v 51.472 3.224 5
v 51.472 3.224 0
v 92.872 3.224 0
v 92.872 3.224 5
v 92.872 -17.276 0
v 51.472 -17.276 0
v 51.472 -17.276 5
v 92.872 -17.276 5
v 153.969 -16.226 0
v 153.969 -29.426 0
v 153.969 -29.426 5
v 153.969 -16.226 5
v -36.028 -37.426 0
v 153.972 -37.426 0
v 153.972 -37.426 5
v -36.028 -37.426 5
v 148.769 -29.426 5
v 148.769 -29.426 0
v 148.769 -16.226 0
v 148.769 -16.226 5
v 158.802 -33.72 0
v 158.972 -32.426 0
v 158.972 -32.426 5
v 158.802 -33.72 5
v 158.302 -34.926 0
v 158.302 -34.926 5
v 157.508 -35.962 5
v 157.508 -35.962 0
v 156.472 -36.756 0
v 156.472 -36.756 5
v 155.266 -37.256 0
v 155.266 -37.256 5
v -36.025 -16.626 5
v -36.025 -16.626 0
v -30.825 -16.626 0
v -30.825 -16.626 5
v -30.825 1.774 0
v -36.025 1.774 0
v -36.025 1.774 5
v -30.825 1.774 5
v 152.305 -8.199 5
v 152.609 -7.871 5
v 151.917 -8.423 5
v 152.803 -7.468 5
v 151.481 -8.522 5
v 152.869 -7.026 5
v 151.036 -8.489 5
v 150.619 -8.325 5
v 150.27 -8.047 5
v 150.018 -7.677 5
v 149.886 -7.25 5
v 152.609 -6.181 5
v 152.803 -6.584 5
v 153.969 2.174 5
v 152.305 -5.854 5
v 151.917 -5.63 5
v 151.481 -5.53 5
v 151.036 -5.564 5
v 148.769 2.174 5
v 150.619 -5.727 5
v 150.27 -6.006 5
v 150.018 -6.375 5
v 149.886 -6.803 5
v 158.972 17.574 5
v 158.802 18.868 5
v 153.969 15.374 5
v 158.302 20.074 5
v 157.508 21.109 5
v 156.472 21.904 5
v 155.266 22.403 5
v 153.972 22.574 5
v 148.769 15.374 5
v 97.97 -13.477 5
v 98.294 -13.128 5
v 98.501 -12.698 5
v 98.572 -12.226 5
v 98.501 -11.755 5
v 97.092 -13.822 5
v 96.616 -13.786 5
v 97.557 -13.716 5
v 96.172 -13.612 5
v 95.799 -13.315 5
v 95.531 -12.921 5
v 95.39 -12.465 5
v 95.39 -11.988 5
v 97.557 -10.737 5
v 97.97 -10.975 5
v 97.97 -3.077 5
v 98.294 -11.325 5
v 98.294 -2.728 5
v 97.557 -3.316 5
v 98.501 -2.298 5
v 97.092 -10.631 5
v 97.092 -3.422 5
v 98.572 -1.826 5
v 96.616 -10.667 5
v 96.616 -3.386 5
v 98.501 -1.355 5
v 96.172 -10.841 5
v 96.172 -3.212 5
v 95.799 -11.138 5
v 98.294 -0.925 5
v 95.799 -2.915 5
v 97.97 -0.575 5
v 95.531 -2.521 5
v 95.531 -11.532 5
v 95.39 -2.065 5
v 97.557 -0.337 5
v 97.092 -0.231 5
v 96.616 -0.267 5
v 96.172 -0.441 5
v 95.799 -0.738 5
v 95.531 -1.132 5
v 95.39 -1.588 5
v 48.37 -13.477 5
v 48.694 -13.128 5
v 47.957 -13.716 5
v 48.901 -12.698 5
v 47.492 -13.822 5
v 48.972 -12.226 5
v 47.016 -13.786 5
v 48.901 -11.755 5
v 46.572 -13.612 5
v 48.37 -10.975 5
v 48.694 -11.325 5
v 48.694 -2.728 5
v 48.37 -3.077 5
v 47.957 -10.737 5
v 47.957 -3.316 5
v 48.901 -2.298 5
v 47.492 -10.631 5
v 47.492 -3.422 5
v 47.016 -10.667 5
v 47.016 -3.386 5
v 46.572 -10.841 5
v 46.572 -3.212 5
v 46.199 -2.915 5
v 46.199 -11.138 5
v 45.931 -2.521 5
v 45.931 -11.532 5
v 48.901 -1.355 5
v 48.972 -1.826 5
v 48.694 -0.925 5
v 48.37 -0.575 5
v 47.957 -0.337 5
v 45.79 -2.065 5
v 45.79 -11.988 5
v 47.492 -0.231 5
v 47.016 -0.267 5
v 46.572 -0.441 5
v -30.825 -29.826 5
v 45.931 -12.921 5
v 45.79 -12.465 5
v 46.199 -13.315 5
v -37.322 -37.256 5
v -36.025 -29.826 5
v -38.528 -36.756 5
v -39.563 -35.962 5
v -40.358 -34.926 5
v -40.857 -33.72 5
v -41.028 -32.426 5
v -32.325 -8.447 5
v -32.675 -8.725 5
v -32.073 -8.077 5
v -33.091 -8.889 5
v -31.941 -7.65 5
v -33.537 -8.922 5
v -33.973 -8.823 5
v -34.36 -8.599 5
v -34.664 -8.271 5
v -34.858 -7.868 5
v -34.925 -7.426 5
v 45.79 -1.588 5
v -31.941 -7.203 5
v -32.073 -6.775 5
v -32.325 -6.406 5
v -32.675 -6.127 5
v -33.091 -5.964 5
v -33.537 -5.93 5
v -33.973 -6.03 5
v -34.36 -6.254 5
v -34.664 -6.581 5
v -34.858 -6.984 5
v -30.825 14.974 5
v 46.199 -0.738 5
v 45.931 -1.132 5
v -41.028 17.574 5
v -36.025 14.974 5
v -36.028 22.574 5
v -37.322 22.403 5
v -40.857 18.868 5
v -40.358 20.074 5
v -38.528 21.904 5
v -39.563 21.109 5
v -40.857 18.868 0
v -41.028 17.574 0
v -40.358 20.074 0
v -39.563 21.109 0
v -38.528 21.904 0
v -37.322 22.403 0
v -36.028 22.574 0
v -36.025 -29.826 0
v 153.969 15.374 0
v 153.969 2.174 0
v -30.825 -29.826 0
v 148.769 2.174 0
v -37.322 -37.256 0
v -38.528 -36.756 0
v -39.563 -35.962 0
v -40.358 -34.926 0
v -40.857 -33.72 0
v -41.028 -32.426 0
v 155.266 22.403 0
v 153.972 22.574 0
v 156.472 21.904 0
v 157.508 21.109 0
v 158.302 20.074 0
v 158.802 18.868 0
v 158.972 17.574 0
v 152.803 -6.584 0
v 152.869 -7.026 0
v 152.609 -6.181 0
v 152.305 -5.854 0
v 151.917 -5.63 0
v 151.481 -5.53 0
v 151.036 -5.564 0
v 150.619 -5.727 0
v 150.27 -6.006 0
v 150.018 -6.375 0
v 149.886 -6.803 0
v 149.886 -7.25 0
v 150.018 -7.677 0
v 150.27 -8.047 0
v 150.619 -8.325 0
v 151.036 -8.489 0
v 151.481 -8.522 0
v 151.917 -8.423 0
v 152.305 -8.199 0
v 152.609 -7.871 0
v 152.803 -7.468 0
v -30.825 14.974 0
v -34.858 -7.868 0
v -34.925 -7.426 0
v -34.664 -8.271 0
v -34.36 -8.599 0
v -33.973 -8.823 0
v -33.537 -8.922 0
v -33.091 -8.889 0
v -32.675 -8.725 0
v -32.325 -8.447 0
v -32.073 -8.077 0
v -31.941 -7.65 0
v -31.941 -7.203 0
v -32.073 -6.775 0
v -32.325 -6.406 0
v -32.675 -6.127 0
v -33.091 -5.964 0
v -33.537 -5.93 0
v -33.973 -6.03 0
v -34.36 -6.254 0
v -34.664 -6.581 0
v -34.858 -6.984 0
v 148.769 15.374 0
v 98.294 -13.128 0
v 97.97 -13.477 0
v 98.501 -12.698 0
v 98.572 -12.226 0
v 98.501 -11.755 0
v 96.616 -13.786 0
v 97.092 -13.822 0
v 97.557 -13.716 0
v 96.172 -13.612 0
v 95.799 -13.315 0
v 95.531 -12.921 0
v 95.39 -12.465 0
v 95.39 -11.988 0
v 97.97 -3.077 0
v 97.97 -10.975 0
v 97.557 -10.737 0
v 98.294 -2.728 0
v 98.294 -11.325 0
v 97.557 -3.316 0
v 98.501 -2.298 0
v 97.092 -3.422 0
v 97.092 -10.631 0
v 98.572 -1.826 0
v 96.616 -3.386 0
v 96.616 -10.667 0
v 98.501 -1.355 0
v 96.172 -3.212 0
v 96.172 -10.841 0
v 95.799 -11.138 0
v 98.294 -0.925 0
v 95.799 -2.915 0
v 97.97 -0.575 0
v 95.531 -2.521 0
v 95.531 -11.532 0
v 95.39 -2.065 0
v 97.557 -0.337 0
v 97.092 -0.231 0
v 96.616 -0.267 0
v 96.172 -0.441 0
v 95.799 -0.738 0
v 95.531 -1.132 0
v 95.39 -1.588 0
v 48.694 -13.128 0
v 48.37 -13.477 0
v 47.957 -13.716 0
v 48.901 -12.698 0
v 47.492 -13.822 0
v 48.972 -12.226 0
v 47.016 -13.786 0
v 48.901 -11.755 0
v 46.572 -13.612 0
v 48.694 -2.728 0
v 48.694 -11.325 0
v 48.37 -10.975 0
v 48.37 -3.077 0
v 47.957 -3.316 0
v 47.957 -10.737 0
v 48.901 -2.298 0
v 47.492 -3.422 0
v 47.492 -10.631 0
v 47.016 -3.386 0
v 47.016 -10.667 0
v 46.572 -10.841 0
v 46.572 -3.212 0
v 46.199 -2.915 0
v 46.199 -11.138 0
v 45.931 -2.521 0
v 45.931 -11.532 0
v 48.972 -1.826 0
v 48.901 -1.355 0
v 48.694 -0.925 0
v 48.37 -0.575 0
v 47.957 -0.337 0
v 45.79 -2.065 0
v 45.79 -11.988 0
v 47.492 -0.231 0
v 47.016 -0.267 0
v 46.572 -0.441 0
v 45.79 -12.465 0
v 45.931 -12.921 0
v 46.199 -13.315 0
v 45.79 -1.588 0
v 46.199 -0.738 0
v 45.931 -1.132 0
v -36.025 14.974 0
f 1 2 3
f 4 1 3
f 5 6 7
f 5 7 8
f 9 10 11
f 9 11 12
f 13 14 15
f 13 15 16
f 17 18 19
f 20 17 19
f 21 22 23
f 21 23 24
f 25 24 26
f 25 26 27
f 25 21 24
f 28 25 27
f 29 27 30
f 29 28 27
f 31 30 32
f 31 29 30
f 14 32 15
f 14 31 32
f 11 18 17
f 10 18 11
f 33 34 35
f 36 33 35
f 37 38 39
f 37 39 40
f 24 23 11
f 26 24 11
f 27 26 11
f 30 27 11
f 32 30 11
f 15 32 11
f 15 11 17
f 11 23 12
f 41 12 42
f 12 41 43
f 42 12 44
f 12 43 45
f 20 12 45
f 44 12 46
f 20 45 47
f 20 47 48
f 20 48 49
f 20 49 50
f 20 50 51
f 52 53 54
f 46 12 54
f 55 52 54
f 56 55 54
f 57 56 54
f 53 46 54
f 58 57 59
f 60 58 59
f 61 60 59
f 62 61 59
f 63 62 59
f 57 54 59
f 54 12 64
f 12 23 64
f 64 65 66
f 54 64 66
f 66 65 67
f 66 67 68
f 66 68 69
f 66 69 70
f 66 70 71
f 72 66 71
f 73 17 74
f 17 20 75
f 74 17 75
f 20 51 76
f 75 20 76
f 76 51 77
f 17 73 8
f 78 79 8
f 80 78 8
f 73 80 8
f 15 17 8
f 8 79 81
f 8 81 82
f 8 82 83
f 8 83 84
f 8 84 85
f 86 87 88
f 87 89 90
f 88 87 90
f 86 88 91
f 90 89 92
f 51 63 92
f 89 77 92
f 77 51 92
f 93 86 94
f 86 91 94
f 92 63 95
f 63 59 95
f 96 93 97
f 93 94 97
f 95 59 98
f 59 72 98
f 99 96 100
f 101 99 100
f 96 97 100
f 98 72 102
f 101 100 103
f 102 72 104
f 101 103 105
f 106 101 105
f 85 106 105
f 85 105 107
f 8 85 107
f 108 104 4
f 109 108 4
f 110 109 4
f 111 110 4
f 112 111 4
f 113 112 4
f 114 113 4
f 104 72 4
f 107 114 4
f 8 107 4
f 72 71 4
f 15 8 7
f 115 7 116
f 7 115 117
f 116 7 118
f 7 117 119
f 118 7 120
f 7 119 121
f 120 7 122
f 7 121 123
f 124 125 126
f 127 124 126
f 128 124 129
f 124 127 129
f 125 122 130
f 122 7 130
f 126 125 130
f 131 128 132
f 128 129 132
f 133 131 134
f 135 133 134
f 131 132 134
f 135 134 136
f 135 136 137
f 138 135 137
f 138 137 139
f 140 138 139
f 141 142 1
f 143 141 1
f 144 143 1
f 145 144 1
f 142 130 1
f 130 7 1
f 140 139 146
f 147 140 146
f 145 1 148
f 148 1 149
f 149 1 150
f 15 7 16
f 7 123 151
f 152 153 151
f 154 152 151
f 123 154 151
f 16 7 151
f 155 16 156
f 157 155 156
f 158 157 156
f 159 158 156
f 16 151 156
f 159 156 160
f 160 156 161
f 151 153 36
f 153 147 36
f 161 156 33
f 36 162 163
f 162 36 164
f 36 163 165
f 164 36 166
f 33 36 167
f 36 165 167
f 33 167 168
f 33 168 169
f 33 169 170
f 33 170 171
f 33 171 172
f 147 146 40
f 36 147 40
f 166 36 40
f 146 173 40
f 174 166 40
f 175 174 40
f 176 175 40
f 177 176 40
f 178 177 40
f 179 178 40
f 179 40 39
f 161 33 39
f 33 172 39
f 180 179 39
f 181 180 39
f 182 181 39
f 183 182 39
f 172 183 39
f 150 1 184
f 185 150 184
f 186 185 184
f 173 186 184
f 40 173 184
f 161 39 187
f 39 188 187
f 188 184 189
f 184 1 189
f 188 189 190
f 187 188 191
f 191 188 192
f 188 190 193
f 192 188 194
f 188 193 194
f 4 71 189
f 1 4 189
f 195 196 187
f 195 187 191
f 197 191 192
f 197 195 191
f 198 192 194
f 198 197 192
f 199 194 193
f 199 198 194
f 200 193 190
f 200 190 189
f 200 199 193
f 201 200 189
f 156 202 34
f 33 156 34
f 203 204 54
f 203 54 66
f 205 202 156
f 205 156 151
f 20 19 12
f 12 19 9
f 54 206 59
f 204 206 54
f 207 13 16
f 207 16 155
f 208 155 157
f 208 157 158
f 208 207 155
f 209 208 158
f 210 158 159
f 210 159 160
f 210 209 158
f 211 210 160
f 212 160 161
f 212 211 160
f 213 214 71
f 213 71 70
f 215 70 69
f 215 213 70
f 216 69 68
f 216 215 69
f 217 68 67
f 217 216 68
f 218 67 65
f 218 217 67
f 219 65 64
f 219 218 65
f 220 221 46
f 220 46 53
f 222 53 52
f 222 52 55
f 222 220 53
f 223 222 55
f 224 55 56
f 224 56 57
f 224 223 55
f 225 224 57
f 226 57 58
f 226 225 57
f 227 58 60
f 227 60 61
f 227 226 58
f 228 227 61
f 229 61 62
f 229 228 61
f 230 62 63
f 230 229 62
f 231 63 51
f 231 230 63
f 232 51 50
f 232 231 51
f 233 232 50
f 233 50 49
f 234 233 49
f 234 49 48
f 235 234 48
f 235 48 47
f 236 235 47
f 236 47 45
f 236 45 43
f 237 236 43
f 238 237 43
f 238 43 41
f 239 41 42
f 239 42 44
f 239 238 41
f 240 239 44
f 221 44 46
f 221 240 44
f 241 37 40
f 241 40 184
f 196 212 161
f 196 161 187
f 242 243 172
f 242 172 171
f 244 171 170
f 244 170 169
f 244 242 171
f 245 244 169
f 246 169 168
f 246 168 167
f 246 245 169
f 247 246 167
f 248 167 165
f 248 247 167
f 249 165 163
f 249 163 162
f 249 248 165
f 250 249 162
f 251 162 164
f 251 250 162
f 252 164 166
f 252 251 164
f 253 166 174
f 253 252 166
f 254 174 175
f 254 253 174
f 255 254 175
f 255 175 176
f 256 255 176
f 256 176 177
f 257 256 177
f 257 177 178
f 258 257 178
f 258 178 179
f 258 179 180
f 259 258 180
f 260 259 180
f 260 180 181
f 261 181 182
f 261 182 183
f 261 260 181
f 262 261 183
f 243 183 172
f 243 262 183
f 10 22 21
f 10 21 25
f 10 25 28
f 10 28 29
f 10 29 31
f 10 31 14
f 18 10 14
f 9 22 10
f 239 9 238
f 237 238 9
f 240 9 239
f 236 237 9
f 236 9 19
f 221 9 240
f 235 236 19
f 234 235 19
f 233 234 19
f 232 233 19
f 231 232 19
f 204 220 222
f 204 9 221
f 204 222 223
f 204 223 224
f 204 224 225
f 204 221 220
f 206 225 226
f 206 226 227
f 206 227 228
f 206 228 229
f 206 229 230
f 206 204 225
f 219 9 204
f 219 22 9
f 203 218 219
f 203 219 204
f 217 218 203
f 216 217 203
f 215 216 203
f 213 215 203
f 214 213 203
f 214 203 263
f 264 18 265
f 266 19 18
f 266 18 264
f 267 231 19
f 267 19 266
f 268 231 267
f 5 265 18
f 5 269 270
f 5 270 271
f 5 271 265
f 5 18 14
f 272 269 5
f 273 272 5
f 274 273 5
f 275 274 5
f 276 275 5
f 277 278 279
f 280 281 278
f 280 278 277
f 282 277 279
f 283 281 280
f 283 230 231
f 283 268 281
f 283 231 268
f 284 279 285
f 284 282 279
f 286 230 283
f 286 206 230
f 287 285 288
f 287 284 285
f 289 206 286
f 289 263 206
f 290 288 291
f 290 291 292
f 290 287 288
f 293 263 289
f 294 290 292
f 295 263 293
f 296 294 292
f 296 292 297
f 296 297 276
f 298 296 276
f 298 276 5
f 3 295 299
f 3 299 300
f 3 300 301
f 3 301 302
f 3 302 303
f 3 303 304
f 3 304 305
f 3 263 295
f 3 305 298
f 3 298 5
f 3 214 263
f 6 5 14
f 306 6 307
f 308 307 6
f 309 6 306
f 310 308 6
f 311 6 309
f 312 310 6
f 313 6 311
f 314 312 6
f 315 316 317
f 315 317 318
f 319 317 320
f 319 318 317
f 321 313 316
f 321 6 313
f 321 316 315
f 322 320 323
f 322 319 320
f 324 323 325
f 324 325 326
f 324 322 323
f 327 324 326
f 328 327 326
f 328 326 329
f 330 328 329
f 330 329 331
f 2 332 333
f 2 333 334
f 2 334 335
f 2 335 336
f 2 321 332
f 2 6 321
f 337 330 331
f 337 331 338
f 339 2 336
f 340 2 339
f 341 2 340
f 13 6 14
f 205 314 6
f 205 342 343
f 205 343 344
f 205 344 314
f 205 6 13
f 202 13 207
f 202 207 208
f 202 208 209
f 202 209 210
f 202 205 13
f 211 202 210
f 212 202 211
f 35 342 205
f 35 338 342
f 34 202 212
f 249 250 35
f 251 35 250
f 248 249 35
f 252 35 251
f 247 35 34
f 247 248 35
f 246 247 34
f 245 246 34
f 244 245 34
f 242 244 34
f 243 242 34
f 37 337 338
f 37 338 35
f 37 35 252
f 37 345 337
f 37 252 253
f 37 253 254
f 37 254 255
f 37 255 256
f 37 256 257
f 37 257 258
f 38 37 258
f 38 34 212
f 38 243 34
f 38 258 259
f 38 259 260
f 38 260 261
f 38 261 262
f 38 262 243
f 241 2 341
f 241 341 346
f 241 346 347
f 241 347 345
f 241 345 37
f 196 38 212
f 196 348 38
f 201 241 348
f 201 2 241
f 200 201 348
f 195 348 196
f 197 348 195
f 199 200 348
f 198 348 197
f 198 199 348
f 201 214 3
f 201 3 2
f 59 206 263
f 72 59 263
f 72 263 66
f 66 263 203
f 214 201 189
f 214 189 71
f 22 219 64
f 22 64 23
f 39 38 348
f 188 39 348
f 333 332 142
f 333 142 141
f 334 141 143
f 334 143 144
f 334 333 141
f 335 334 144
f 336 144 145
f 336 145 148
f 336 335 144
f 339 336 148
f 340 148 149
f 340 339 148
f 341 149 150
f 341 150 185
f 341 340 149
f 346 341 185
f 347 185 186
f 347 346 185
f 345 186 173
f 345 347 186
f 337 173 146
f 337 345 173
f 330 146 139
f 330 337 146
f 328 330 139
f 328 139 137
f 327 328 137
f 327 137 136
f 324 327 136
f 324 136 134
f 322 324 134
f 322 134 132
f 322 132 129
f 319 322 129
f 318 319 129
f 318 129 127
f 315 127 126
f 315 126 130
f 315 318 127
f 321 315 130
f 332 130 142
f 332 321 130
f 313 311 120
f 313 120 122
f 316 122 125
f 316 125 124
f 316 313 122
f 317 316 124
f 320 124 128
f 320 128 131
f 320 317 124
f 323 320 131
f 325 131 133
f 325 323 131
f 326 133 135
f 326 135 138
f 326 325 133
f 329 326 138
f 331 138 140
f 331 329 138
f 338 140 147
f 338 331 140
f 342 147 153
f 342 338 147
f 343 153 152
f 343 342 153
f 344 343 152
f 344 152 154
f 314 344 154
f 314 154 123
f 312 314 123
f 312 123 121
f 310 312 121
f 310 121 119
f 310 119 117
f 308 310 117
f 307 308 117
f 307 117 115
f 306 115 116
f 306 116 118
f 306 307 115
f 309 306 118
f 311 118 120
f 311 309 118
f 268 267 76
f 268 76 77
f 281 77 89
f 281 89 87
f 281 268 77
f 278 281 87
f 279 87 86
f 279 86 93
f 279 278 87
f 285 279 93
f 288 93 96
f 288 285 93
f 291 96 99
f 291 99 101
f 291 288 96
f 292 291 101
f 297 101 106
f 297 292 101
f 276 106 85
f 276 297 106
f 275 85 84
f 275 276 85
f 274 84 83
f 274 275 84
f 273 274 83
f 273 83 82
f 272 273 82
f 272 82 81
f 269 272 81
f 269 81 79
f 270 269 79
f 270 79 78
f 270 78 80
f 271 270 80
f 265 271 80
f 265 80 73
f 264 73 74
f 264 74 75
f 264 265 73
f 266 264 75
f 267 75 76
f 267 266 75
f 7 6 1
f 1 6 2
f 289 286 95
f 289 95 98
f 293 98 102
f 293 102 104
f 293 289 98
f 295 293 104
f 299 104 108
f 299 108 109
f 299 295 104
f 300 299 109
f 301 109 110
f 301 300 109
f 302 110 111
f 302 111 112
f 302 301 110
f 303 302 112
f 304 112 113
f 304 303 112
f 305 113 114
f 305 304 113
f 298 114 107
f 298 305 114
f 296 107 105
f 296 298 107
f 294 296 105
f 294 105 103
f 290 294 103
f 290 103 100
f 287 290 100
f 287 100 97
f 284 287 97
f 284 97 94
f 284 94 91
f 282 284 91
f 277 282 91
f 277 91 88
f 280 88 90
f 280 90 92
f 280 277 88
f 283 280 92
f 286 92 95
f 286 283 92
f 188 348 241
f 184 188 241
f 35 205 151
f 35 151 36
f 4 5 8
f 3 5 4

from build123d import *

# Parameters (mm, degrees)
SKETCH1_R           = 1.6
SKETCH1_R_2         = 1.5
SKETCH1_W           = 5.2
SKETCH1_H           = 13.2
SKETCH1_W_2         = 41.4
SKETCH1_H_2         = 20.5
BOSS_EXTRUDE1_DEPTH = 5


with BuildPart() as part:
    # Sketch1 → Boss-Extrude1 (new body)
    with BuildSketch(Plane.XY):
        with BuildLine():
            Line((-36.027647281, 22.573731276), (153.972352719, 22.573731276))
            ThreePointArc((153.972352719, 22.573731276), (157.507886625, 21.109265182), (158.972352719, 17.573731276))
            Line((158.972352719, 17.573731276), (158.972352719, -32.426268724))
            ThreePointArc((158.972352719, -32.426268724), (157.507886625, -35.96180263), (153.972352719, -37.426268724))
            Line((153.972352719, -37.426268724), (-36.027647281, -37.426268724))
            ThreePointArc((-36.027647281, -37.426268724), (-39.563181187, -35.96180263), (-41.027647281, -32.426268724))
            Line((-41.027647281, -32.426268724), (-41.027647281, 17.573731276))
            ThreePointArc((-41.027647281, 17.573731276), (-39.563181187, 21.109265182), (-36.027647281, 22.573731276))
        make_face()
        with Locations((47.372352719, -1.826397645)):
            Circle(SKETCH1_R, mode=Mode.SUBTRACT)
        with Locations((47.372352719, -12.226397645)):
            Circle(SKETCH1_R, mode=Mode.SUBTRACT)
        with Locations((96.972352719, -12.226397645)):
            Circle(SKETCH1_R, mode=Mode.SUBTRACT)
        with Locations((96.972352719, -1.826397645)):
            Circle(SKETCH1_R, mode=Mode.SUBTRACT)
        with Locations((151.369386748, -7.026268724)):
            Circle(SKETCH1_R_2, mode=Mode.SUBTRACT)
        with Locations(Location((-33.42468131, -7.426268724, 0), (0, 0, 180))):
            Circle(SKETCH1_R_2, mode=Mode.SUBTRACT)
        with Locations((-33.42468131, 8.373731276)):
            Rectangle(SKETCH1_W, SKETCH1_H, mode=Mode.SUBTRACT)
        with Locations((151.369386748, -22.826268724)):
            Rectangle(SKETCH1_W, SKETCH1_H, mode=Mode.SUBTRACT)
        with Locations((151.369386748, 8.773731276)):
            Rectangle(SKETCH1_W, SKETCH1_H, mode=Mode.SUBTRACT)
        with Locations((72.172352719, -7.026268724)):
            Rectangle(SKETCH1_W_2, SKETCH1_H_2, mode=Mode.SUBTRACT)
        with Locations((-33.42468131, -23.226268724)):
            Rectangle(SKETCH1_W, SKETCH1_H, mode=Mode.SUBTRACT)
    extrude(amount=BOSS_EXTRUDE1_DEPTH)


solid = part.part
